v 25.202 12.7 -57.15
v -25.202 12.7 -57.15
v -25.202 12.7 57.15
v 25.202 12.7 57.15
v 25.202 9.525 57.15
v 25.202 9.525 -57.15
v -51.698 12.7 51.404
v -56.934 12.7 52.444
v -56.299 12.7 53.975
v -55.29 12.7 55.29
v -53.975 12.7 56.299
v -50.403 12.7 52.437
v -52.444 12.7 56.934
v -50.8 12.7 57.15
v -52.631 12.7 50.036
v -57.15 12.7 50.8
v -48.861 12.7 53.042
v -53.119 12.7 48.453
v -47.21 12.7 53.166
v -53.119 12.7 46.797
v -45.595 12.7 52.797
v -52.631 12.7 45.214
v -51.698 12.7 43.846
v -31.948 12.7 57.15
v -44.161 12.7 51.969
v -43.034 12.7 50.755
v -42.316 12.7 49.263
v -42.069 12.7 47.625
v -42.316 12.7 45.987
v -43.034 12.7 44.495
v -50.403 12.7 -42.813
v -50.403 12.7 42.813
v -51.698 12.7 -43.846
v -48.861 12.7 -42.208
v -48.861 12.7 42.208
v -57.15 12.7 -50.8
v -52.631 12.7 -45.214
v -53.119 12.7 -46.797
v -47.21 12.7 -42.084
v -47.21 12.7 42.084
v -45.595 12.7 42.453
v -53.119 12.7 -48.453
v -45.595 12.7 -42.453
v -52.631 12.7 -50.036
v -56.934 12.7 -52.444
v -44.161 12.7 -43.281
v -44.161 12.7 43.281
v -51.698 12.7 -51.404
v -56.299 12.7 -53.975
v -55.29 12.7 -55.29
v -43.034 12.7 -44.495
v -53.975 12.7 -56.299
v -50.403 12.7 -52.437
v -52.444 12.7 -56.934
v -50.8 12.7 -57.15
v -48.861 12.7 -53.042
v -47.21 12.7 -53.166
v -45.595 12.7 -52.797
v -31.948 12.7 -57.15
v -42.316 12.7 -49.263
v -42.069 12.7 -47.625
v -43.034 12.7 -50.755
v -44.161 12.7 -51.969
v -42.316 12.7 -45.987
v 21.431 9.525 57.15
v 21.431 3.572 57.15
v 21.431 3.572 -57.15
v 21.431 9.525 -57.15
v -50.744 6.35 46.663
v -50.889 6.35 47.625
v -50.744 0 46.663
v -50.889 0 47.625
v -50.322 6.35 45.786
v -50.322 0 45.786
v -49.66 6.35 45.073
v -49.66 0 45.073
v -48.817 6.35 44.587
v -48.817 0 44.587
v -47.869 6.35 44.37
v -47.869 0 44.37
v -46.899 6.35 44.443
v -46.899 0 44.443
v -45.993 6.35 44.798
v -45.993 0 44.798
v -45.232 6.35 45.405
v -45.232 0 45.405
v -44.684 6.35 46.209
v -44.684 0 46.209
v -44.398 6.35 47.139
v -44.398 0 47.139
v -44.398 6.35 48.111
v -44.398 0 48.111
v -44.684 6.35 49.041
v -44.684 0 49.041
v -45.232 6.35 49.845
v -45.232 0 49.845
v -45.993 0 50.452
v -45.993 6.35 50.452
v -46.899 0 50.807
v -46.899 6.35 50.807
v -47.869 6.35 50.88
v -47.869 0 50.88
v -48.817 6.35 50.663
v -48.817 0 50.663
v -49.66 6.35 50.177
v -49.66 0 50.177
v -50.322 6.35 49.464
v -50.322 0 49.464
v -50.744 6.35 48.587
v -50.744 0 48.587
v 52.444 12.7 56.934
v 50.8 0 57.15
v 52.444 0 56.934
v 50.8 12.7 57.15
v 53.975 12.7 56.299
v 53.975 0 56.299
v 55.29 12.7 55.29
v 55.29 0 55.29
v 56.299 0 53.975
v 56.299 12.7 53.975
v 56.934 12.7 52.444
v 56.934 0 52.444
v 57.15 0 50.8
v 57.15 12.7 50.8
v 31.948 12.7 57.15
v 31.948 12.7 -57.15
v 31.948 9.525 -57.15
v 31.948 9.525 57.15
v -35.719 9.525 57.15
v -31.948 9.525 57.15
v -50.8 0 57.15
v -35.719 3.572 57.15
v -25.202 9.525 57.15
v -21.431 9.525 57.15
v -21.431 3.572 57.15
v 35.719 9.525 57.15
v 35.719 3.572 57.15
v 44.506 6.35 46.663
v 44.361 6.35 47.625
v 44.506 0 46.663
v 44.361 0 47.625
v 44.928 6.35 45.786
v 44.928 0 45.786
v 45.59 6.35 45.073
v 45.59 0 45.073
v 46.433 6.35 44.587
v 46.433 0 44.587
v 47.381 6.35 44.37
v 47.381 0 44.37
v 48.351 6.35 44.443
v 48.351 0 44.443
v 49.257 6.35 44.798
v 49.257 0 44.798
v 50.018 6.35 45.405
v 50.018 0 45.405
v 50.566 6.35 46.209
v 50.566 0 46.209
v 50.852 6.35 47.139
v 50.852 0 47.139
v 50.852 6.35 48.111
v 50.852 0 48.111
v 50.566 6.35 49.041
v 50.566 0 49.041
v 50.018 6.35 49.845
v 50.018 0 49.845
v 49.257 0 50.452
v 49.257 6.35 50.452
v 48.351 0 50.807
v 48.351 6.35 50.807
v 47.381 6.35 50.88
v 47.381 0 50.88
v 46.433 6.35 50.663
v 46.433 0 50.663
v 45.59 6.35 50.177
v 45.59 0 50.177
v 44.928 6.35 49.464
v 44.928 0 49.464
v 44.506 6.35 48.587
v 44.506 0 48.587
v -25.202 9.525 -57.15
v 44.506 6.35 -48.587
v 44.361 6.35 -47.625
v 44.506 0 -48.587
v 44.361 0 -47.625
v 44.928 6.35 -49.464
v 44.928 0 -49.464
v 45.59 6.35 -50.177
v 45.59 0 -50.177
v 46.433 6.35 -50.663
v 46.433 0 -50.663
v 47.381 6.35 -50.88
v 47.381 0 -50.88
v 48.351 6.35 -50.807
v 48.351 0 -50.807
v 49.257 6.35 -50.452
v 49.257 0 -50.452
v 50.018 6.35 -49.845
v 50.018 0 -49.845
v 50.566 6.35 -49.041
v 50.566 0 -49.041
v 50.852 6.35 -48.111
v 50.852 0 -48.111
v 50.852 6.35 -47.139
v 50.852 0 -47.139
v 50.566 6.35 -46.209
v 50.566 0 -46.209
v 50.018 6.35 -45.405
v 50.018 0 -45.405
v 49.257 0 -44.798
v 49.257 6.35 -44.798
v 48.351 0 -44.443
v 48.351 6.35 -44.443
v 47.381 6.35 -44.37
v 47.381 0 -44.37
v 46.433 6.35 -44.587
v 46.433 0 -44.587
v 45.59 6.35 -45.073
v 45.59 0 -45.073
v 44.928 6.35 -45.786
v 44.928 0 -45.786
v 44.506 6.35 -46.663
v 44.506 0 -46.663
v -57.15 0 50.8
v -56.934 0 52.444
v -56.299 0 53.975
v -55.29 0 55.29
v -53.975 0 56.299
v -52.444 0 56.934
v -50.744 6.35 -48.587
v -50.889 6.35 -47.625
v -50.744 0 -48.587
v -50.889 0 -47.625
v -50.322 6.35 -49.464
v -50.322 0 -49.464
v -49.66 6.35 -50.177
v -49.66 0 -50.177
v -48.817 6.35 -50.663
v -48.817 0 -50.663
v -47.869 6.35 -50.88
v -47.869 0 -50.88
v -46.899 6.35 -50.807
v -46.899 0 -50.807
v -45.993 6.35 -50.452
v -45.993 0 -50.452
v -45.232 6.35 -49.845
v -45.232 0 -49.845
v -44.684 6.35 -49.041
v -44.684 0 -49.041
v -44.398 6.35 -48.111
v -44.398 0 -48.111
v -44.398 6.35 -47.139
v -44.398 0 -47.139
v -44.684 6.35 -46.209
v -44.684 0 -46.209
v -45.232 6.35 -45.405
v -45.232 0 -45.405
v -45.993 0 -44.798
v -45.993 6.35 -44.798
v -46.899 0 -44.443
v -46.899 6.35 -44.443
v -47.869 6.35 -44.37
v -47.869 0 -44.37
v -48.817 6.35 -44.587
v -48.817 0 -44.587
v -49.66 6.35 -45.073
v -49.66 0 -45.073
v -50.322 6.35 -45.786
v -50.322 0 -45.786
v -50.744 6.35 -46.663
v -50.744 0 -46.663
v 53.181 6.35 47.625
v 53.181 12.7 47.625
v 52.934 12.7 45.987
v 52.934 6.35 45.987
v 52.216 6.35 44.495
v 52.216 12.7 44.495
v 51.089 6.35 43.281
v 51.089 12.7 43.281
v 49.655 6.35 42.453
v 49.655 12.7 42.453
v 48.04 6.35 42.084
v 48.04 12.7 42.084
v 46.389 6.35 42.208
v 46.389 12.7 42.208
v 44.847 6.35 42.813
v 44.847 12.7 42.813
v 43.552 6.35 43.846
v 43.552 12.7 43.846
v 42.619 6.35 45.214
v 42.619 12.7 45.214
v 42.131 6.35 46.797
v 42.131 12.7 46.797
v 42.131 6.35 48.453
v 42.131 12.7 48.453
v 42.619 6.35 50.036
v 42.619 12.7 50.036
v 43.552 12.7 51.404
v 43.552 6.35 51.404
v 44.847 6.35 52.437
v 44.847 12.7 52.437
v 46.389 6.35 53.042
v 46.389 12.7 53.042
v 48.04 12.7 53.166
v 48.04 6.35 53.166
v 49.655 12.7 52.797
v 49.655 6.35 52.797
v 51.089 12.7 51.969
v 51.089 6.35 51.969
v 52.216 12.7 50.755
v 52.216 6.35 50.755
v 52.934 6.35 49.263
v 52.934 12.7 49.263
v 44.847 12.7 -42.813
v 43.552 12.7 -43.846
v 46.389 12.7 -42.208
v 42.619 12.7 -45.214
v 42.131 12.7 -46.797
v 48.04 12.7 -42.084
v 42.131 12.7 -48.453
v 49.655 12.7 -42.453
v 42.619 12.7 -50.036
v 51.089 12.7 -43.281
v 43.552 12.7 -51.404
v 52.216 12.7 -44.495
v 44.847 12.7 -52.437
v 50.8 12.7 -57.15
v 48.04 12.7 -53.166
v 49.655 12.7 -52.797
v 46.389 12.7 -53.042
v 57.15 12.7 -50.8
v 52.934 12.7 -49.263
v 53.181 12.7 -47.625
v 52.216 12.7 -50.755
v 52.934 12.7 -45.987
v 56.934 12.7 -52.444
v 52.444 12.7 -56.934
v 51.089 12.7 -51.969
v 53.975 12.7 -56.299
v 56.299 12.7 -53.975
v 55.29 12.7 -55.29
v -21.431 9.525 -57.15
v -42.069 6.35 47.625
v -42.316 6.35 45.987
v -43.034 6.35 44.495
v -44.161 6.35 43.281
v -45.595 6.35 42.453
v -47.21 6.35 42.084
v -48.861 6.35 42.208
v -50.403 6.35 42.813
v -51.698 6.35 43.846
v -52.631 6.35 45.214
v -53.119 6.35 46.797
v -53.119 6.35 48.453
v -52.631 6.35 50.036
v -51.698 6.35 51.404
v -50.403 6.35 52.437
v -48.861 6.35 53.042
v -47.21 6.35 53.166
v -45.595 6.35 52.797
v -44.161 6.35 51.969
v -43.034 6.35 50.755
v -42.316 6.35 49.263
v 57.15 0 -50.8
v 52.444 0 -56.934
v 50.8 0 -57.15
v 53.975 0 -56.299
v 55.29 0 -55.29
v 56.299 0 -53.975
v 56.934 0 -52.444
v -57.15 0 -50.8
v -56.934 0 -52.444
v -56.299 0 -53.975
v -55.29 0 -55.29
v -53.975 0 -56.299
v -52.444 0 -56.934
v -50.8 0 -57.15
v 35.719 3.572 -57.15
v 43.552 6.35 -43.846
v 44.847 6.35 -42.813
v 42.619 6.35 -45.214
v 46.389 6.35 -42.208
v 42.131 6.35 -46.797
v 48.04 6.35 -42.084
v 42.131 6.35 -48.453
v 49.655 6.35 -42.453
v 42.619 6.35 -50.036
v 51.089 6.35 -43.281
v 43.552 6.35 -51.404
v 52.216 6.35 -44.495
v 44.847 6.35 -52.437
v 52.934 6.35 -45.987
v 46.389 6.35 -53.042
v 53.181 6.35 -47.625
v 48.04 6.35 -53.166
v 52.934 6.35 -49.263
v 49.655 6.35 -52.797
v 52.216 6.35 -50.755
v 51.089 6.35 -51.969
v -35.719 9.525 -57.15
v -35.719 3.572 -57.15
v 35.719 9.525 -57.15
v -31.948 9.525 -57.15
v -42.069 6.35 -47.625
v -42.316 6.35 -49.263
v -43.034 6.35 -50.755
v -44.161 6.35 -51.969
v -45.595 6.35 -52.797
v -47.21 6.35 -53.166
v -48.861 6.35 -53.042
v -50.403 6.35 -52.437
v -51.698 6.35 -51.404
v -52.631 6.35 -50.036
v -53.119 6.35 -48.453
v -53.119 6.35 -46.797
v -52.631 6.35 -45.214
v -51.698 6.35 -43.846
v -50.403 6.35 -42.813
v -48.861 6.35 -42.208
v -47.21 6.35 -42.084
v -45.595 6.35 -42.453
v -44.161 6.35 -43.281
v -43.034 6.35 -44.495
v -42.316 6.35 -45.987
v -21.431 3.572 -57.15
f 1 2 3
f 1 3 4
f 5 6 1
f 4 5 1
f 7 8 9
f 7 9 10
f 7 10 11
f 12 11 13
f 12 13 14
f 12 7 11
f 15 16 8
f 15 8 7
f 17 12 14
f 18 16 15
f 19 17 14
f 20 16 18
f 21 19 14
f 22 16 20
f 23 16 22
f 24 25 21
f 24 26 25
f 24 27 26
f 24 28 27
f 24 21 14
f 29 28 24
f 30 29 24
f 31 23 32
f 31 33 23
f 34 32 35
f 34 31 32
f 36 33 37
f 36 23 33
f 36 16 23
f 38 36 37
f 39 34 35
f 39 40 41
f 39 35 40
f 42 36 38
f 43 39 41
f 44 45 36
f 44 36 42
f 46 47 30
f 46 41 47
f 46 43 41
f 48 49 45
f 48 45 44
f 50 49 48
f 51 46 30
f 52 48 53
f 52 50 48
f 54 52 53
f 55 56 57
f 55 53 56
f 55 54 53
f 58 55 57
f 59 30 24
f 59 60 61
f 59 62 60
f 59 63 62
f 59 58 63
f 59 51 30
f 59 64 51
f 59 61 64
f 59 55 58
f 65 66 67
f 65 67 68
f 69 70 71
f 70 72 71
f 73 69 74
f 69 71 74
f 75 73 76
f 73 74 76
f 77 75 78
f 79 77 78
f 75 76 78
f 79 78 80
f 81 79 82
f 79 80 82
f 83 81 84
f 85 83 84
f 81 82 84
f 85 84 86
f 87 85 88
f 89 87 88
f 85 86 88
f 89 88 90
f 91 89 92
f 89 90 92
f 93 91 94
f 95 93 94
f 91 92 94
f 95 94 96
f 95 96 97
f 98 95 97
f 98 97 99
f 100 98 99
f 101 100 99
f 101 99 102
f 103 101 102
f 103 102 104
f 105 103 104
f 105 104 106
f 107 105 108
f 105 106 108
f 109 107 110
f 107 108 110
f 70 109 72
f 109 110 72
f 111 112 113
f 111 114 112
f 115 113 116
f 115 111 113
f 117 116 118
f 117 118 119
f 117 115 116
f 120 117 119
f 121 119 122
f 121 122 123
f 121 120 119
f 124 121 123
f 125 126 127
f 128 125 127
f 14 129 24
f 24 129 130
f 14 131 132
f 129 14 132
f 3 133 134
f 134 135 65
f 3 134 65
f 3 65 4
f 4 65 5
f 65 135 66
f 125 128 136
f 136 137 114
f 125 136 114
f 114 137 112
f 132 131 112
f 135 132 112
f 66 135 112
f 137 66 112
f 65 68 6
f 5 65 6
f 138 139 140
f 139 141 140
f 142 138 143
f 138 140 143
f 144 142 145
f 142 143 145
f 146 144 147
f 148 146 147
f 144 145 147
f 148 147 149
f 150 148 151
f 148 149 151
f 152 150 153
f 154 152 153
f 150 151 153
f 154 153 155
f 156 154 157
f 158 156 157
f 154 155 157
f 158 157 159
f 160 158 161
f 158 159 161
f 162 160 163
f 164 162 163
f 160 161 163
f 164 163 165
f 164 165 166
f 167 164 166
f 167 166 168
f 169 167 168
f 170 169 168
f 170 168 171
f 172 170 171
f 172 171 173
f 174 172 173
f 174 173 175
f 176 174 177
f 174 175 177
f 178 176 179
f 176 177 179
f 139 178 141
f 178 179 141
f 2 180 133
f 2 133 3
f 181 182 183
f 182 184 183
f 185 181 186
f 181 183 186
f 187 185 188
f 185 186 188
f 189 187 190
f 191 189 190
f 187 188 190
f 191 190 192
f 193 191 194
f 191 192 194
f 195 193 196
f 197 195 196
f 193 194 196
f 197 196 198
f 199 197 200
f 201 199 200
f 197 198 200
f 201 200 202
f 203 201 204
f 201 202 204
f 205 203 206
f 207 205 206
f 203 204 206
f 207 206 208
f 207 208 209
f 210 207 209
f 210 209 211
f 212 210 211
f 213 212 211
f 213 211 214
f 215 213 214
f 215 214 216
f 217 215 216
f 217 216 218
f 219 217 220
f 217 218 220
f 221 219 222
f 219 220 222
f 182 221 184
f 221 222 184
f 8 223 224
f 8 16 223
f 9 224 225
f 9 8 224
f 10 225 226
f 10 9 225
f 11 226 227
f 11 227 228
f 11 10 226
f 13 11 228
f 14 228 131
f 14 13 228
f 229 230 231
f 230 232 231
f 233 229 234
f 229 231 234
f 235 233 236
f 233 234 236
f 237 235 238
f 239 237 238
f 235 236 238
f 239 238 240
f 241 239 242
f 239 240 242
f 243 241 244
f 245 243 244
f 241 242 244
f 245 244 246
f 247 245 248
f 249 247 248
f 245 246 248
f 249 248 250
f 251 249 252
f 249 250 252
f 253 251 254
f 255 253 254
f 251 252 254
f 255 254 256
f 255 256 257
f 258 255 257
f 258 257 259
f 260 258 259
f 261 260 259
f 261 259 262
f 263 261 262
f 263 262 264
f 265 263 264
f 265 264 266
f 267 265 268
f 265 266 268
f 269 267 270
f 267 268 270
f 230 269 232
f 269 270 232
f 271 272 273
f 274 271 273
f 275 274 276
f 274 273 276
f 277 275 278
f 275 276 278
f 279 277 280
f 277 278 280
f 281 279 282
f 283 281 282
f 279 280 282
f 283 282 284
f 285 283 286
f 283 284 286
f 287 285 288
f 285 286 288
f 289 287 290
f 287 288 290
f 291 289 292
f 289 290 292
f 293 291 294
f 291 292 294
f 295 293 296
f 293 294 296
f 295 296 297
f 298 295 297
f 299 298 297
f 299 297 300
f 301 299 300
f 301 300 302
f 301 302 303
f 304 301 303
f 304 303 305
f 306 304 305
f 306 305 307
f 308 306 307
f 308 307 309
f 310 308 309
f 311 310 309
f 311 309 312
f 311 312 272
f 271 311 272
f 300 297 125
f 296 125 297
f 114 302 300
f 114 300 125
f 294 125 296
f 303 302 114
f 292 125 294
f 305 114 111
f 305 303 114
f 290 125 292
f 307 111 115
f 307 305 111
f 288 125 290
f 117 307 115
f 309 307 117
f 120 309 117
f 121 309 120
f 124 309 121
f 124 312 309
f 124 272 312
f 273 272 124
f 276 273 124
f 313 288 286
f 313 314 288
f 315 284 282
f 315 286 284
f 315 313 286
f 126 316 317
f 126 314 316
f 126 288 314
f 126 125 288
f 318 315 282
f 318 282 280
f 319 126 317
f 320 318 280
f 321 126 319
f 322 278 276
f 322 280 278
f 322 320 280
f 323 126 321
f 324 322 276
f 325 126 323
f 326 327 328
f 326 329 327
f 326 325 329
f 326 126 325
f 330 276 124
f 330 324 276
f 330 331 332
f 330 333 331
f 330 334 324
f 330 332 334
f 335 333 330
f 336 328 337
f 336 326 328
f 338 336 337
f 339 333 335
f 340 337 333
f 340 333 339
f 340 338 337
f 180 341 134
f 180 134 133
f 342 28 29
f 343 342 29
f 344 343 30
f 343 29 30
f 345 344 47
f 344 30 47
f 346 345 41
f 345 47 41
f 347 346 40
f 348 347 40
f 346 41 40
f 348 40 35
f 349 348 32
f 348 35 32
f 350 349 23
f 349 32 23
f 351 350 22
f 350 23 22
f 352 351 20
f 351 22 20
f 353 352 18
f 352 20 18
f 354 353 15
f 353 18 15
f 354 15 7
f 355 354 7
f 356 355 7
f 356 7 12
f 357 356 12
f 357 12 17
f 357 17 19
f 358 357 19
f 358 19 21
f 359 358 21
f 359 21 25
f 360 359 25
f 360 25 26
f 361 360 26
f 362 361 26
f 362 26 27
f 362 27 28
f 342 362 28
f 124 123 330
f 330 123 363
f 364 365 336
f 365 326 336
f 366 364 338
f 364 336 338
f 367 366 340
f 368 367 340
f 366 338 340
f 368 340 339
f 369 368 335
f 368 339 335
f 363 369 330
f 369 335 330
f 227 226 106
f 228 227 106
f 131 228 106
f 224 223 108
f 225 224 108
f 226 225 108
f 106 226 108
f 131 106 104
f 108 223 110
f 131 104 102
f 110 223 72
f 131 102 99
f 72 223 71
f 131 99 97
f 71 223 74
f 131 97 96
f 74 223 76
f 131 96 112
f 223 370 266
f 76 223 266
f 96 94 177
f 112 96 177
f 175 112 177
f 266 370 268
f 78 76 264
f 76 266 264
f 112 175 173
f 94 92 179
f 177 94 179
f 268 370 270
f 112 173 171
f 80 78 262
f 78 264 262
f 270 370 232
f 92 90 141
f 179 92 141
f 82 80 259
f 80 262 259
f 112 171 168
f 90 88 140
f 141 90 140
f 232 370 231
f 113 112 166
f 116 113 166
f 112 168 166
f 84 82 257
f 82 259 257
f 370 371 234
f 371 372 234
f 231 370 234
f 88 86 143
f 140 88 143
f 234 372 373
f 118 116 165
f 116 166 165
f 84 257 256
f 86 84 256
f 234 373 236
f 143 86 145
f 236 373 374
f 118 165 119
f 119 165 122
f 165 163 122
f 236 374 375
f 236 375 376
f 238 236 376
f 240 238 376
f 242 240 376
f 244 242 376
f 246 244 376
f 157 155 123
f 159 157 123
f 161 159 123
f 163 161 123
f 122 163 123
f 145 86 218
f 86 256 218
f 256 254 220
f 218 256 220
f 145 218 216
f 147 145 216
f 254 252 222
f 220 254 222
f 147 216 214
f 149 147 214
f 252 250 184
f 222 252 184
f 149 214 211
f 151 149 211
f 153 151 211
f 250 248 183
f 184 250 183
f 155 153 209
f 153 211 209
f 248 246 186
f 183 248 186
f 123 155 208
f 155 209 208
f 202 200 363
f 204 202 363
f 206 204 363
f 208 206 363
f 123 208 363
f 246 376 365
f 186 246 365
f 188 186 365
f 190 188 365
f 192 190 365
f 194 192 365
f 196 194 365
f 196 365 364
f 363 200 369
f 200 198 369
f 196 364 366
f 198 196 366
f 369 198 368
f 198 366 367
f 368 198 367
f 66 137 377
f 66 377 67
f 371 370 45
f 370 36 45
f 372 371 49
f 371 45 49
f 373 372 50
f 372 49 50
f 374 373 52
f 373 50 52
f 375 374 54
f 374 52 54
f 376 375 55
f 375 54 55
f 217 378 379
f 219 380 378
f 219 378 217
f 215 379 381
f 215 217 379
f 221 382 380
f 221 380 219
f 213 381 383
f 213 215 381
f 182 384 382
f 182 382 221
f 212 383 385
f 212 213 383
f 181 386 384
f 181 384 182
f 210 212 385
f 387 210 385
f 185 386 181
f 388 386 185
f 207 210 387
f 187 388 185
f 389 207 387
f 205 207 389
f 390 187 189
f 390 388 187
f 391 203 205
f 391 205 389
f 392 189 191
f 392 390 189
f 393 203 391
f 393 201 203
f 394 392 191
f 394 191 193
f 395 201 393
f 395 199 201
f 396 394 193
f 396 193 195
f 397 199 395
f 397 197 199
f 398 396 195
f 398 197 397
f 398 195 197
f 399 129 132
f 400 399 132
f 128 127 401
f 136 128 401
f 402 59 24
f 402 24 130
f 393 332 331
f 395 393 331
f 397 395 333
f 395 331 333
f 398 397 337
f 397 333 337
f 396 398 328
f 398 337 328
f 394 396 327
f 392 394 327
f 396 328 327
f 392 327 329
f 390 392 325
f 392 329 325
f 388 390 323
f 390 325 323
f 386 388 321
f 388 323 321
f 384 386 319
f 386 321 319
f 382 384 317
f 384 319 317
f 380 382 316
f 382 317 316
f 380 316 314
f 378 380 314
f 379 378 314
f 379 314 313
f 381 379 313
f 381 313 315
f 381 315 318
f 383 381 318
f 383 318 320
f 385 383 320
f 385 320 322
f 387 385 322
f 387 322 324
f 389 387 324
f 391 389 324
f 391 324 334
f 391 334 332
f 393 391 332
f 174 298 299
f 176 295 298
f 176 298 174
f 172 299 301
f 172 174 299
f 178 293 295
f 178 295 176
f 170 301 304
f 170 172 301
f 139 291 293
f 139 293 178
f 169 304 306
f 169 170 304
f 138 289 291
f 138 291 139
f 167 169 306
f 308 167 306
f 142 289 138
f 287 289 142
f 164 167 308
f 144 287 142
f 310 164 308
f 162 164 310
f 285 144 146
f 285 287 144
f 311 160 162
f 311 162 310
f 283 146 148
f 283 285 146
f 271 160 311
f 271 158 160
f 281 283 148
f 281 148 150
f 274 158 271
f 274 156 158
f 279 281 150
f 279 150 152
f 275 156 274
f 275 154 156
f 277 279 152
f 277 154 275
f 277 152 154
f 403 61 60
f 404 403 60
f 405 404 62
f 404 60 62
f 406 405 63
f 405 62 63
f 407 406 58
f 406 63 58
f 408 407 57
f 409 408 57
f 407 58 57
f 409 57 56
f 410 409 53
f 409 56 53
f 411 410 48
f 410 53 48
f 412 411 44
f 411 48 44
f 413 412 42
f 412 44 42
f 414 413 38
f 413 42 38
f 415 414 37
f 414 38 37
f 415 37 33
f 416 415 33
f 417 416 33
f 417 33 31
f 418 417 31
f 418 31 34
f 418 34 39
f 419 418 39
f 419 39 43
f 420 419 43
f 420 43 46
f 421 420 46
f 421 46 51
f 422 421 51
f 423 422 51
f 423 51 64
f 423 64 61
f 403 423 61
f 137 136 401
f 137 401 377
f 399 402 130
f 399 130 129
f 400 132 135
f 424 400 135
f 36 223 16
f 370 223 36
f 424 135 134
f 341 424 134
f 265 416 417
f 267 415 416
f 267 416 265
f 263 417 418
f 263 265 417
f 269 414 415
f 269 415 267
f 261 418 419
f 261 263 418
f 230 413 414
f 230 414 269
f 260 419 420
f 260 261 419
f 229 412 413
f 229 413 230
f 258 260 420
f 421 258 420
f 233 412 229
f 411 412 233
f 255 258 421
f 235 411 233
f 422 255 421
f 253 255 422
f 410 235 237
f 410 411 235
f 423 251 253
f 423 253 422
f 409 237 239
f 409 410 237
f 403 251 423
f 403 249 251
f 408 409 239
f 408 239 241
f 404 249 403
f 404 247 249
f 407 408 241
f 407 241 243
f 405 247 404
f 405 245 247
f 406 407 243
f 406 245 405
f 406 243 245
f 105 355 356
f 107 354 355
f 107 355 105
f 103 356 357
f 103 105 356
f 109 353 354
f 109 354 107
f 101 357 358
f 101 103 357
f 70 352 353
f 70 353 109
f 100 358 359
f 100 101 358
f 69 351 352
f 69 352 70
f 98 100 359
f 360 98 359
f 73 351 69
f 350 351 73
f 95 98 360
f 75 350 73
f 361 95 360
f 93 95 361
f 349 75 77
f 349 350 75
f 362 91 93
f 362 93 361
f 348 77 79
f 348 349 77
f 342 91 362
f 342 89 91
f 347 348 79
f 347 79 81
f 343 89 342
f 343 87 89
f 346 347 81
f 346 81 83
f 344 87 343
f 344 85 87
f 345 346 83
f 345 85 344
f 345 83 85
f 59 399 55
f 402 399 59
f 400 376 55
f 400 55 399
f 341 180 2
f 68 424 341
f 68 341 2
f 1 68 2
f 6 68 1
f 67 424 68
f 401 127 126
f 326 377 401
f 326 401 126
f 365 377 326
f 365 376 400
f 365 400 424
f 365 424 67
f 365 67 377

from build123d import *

# Parameters (mm, degrees)
SKETCH1_W                                        = 114.3
SKETCH1_H                                        = 114.3
BOSS_EXTRUDE1_DEPTH                              = 12.7
CBORE_FOR_1_4_SOCKET_HEAD_CAP_SCREW1_D           = 6.5278
CBORE_FOR_1_4_SOCKET_HEAD_CAP_SCREW1_CBORE_D     = 11.1125
CBORE_FOR_1_4_SOCKET_HEAD_CAP_SCREW1_CBORE_DEPTH = 6.35
T_SLOT_CUT_WITH_MCMASTER_8789A16_BIT_DEPTH       = 129.420802443
FILLET1_R                                        = 6.35


with BuildPart() as part:
    # Sketch1 → Boss-Extrude1 (new body)
    with BuildSketch(Plane(origin=(0, 0, 0), x_dir=(1, 0, 0), z_dir=(0, 1, 0))):
        Rectangle(SKETCH1_W, SKETCH1_H)
    extrude(amount=BOSS_EXTRUDE1_DEPTH)

    # CBORE for 1/4 Socket Head Cap Screw1 (through all)
    with Locations(Plane(origin=(0, 12.7, 0), x_dir=(1, 0, 0), z_dir=(0, 1, 0))):
        with Locations((-47.625, 47.625), (47.625, 47.625), (47.625, -47.625), (-47.625, -47.625)):
            CounterBoreHole(CBORE_FOR_1_4_SOCKET_HEAD_CAP_SCREW1_D / 2, CBORE_FOR_1_4_SOCKET_HEAD_CAP_SCREW1_CBORE_D / 2, CBORE_FOR_1_4_SOCKET_HEAD_CAP_SCREW1_CBORE_DEPTH)

    # Sketch4 → T-SLOT CUT WITH MCMASTER 8789A16 BIT (cut, through all)
    with BuildSketch(Plane.XY.offset(57.15)):
        Polygon((-31.9484375, 12.7), (-31.9484375, 9.525), (-35.71875, 9.525), (-35.71875, 3.571875), (-21.43125, 3.571875), (-21.43125, 9.525), (-25.2015625, 9.525), (-25.2015625, 12.7), align=None)
        Polygon((25.2015625, 9.525), (25.2015625, 12.7), (31.9484375, 12.7), (31.9484375, 9.525), (35.71875, 9.525), (35.71875, 3.571875), (21.43125, 3.571875), (21.43125, 9.525), align=None)
    extrude(amount=-T_SLOT_CUT_WITH_MCMASTER_8789A16_BIT_DEPTH, mode=Mode.SUBTRACT)

    # Fillet1
    fillet1_edges = [part.edges().sort_by_distance(p)[0] for p in [
        (57.15, 6.35, 57.15),
        (-57.15, 6.35, 57.15),
        (-57.15, 6.35, -57.15),
        (57.15, 6.35, -57.15),
    ]]
    fillet(fillet1_edges, radius=FILLET1_R)


solid = part.part
